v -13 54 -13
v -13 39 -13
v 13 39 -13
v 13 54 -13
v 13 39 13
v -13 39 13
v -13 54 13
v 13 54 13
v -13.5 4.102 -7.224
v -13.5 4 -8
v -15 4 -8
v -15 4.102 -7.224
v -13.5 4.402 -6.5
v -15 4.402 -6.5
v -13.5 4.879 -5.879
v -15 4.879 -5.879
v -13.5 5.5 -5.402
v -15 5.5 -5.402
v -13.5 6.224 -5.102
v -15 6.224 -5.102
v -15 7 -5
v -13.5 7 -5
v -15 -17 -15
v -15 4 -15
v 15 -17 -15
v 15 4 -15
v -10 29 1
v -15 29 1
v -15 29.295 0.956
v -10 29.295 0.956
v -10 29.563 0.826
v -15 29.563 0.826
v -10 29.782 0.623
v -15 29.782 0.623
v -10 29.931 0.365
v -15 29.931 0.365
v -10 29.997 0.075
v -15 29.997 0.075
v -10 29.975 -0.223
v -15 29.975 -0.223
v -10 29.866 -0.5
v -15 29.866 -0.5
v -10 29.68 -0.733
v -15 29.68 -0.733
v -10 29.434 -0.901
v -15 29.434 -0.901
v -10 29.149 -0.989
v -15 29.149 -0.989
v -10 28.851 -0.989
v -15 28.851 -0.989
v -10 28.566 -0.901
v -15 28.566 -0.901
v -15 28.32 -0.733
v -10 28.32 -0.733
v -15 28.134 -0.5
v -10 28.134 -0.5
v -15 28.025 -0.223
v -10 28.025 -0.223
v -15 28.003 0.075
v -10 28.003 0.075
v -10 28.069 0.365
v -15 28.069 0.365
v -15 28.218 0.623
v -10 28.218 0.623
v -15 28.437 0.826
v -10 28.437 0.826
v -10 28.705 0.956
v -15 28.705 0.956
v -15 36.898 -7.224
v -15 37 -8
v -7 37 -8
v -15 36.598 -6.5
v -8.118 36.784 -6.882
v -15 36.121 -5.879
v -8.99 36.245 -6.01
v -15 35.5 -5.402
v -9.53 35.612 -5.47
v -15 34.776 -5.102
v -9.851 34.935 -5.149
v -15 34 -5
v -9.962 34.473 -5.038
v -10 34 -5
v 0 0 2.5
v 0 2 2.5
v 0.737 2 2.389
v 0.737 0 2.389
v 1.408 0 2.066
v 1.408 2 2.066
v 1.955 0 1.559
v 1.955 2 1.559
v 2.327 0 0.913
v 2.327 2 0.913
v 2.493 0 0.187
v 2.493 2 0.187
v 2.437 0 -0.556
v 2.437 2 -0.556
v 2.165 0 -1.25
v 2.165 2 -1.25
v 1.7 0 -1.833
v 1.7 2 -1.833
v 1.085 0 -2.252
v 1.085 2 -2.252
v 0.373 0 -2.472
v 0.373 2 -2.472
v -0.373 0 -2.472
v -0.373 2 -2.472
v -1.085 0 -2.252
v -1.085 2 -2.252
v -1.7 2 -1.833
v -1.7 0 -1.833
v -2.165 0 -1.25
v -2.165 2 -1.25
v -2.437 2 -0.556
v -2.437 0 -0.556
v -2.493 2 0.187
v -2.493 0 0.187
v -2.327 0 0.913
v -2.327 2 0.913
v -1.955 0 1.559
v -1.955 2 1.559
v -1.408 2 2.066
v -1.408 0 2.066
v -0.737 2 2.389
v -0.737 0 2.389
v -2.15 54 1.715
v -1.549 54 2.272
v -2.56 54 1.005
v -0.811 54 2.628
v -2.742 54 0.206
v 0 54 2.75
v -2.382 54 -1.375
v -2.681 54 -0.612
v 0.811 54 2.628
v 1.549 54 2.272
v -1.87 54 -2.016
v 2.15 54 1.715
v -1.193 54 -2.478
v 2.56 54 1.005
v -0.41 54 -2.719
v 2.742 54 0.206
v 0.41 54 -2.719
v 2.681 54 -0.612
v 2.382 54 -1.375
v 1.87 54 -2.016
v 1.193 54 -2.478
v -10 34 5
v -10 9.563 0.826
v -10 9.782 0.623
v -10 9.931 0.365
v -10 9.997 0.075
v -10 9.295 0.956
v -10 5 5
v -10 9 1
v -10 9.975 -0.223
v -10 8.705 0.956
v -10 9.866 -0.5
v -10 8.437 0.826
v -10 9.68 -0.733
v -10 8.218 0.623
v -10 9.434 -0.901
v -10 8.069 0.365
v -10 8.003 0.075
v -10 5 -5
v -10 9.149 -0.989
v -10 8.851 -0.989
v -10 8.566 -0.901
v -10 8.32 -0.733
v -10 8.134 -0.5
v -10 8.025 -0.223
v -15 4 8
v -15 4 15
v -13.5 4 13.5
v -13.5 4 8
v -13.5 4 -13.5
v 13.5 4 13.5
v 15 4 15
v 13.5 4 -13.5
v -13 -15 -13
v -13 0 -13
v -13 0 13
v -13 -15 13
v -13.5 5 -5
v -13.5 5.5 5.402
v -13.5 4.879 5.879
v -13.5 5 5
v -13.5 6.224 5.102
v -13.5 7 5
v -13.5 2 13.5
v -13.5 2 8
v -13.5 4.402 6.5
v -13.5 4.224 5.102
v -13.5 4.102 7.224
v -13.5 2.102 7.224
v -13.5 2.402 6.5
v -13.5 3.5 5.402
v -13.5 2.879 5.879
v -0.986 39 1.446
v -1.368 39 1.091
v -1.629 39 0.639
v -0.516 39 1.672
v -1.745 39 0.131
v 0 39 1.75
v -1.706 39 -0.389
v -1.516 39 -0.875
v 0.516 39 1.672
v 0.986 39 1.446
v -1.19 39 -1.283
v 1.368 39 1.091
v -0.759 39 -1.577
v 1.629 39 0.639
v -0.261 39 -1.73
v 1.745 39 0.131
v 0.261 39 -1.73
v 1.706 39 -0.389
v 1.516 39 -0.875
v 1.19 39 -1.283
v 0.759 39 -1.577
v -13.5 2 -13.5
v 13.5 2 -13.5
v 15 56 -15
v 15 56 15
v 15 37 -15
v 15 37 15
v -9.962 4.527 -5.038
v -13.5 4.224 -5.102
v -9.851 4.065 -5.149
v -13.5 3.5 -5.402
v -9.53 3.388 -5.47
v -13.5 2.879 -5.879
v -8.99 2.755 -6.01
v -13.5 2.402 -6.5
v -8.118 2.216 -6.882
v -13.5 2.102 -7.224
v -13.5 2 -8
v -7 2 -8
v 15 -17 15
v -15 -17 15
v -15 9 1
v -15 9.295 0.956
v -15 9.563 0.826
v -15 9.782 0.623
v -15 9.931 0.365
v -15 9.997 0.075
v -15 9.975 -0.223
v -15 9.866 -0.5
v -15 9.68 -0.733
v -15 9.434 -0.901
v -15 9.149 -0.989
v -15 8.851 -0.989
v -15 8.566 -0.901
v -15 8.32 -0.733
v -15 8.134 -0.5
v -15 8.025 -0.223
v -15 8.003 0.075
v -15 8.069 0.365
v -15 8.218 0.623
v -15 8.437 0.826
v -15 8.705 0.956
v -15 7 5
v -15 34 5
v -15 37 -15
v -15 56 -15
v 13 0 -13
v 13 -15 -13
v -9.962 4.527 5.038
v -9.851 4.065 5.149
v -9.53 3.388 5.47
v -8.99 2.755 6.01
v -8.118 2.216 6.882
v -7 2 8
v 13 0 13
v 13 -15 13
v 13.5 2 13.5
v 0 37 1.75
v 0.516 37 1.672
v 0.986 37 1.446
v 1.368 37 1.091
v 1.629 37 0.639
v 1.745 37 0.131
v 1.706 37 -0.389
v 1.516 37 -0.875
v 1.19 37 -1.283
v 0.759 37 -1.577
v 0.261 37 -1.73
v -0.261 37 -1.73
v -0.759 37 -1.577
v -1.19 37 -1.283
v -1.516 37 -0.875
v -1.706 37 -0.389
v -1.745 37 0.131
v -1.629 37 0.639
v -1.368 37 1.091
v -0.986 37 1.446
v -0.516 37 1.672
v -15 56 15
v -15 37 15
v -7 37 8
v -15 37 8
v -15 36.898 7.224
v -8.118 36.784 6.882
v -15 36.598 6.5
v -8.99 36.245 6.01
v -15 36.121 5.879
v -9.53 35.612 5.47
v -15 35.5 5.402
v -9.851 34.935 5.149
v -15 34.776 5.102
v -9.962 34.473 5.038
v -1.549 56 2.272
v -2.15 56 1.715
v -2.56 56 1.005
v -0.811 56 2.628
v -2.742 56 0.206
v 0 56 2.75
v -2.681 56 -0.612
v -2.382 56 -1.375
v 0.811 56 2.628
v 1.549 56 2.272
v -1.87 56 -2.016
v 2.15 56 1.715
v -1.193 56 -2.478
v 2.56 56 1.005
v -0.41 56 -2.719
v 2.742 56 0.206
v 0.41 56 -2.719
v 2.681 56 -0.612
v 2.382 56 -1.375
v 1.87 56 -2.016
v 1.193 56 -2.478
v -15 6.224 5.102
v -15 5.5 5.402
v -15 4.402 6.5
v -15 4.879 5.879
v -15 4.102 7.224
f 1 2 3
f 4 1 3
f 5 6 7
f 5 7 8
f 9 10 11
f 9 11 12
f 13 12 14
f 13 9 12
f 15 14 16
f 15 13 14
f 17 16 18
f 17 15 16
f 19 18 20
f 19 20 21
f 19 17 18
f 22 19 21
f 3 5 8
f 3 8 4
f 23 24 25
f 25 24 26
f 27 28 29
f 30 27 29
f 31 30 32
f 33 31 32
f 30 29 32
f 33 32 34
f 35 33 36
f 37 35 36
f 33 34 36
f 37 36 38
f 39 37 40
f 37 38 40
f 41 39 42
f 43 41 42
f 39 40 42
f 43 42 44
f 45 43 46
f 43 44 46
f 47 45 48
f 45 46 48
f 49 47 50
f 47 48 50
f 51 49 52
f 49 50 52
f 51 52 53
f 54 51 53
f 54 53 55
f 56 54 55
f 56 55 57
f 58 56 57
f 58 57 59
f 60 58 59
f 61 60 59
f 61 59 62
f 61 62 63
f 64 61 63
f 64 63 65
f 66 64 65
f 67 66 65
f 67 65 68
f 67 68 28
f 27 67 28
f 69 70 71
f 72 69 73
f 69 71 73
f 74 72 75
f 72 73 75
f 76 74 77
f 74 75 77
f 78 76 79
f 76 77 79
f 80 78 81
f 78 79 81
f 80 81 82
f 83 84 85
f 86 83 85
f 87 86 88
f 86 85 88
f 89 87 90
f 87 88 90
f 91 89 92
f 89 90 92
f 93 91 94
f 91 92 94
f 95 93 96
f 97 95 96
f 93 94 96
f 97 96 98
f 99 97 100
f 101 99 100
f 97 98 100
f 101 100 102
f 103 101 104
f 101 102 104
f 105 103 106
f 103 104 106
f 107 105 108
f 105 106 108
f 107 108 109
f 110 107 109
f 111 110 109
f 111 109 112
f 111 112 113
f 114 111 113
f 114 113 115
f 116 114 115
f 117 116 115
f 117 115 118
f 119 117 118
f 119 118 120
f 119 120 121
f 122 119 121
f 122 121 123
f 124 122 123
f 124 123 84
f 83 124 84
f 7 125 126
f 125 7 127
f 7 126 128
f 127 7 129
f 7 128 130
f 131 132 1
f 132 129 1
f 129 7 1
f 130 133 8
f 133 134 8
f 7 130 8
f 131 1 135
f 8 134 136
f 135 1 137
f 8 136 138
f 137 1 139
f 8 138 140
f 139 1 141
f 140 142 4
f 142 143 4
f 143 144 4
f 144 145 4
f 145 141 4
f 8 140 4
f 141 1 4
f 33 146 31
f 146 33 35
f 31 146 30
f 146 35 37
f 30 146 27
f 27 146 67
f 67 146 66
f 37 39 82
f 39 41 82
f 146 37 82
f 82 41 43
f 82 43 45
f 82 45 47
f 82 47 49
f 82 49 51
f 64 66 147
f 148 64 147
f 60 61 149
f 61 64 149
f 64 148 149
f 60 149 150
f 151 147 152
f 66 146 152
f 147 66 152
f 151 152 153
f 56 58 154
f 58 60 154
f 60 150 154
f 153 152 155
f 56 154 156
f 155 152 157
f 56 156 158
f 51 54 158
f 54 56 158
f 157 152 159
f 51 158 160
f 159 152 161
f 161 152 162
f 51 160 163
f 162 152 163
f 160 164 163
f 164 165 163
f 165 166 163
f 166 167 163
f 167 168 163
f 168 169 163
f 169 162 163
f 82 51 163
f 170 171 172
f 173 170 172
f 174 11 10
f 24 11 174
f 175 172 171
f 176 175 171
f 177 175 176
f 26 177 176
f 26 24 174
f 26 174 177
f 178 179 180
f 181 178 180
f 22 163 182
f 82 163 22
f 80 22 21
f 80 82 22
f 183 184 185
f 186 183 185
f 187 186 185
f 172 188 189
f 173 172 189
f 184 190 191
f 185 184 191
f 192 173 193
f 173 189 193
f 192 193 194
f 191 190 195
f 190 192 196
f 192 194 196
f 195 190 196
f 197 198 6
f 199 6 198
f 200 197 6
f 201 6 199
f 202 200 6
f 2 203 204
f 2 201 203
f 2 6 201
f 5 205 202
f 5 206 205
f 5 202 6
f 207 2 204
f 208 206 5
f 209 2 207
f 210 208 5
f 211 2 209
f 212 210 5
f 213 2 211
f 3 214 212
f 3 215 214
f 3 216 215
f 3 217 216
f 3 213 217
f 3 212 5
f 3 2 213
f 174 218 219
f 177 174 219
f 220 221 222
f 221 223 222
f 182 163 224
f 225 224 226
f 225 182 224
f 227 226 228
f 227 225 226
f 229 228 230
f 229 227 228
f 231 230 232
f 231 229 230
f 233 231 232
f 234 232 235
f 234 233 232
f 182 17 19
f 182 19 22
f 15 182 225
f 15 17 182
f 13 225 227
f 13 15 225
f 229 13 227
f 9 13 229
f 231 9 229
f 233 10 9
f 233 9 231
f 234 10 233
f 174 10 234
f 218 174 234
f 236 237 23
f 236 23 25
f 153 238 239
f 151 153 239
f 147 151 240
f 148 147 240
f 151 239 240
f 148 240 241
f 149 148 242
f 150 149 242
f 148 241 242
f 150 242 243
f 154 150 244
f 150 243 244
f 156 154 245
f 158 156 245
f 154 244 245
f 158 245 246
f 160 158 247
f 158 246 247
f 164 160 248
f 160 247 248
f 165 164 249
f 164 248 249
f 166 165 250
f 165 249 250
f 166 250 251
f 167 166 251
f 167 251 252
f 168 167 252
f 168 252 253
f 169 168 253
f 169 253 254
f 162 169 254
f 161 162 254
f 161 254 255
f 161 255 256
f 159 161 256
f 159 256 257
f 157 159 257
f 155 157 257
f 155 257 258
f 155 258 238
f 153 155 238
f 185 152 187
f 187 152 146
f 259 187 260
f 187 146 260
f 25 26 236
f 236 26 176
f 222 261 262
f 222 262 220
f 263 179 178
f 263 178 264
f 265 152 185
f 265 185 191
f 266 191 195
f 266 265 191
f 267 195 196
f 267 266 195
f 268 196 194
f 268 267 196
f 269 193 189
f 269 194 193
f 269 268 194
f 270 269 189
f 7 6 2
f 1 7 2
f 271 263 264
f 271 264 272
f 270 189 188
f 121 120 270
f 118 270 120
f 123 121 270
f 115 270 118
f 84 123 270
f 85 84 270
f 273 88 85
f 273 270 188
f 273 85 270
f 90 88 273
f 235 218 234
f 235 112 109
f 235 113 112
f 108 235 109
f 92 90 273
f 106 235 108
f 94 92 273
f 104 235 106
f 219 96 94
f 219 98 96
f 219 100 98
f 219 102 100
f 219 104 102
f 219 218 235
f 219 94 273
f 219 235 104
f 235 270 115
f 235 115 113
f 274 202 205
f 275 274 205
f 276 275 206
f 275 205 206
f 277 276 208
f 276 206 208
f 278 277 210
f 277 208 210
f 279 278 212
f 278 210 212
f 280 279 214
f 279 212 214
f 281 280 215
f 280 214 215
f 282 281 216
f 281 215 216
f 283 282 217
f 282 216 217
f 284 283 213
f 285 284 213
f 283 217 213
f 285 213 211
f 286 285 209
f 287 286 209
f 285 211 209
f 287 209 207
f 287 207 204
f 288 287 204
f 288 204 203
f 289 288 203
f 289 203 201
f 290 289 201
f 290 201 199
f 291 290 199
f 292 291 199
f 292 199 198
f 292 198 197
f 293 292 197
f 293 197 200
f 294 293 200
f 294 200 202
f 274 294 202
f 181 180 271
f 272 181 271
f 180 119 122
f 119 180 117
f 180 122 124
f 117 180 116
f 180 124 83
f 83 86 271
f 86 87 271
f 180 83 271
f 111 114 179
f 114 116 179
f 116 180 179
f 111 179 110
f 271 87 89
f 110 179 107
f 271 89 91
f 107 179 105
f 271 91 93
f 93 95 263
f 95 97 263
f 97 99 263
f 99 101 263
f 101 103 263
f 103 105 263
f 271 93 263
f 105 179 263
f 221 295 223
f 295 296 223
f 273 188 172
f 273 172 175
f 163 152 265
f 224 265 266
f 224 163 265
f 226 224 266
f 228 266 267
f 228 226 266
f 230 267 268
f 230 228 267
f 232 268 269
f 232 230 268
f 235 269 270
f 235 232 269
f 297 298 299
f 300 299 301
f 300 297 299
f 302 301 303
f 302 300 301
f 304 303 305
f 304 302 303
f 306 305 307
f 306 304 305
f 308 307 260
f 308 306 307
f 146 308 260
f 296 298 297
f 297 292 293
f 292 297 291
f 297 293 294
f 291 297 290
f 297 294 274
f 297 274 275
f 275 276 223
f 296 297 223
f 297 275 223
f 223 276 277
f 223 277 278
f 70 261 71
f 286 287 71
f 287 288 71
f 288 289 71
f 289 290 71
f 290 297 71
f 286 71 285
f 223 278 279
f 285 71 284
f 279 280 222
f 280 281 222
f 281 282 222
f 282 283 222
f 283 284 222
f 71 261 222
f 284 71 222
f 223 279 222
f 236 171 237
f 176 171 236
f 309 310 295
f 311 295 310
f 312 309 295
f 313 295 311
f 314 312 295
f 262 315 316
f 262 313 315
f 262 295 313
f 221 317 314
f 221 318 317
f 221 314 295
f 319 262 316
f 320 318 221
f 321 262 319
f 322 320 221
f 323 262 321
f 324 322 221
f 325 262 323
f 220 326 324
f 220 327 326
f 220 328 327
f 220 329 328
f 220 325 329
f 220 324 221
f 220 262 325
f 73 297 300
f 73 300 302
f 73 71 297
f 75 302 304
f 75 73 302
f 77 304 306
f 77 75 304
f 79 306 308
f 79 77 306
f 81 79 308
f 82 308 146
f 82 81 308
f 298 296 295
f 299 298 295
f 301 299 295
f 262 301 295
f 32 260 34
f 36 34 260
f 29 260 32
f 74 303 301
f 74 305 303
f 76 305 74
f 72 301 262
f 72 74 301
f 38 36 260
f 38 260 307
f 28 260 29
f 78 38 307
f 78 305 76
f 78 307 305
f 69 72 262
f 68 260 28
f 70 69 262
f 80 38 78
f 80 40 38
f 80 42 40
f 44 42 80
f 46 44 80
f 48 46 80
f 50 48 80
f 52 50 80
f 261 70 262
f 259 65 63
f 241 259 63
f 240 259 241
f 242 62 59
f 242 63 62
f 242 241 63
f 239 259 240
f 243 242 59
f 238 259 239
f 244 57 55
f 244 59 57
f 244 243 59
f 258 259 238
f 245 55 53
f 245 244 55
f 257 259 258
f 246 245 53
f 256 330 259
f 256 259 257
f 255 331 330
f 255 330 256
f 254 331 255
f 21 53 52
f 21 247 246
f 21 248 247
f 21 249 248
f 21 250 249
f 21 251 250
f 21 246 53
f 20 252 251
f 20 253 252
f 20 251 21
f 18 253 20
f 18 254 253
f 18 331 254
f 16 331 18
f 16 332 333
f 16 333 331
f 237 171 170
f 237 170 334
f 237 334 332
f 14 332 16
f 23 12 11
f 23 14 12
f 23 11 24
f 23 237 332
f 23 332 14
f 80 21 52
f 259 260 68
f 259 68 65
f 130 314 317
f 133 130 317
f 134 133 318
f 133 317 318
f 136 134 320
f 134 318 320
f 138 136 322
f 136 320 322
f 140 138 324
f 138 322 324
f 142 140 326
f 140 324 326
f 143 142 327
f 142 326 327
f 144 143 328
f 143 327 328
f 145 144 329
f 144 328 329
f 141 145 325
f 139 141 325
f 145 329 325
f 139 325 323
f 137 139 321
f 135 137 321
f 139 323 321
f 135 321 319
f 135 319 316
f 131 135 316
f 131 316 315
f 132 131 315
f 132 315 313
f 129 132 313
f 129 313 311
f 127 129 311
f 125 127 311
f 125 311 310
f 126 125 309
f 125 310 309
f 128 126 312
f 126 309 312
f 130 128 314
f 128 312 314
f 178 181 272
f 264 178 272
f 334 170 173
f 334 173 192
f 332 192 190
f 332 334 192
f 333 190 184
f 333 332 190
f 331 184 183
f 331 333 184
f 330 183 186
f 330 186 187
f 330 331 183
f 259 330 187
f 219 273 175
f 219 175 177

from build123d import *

# Parameters (mm, degrees)
SKETCH_2_W          = 30
SKETCH_2_H          = 30
EXTRUDE_1_DEPTH     = 2
SKETCH_3_W          = 30
SKETCH_3_H          = 30
SKETCH_3_W_2        = 26
SKETCH_3_H_2        = 26
EXTRUDE_2_DEPTH     = 15
SKETCH_4_W          = 30
SKETCH_4_H          = 30
SKETCH_4_W_2        = 27
SKETCH_4_H_2        = 27
EXTRUDE_3_DEPTH     = 2
SKETCH_5_W          = 5
SKETCH_5_H          = 10
EXTRUDE_2_2_DEPTH   = 35
SKETCH_6_R          = 1
CUT_EXTRUDE_1_DEPTH = 50.939963957
SKETCH_8_R          = 2.5
CUT_EXTRUDE_2_DEPTH = 41.926763859
FILLET_1_R          = 3
FILLET_2_R          = 3
SKETCH_9_W          = 30
SKETCH_9_H          = 30
EXTRUDE_3_2_DEPTH   = 2
SKETCH_10_W         = 30
SKETCH_10_H         = 30
SKETCH_10_W_2       = 26
SKETCH_10_H_2       = 26
EXTRUDE_4_DEPTH     = 15
SKETCH_11_R         = 1.75
CUT_EXTRUDE_3_DEPTH = 3
FILLET_3_R          = 3
SKETCH_13_W         = 30
SKETCH_13_H         = 30
EXTRUDE_4_2_DEPTH   = 2
SKETCH_14_W         = 30
SKETCH_14_H         = 30
EXTRUDE_5_DEPTH     = 2
SKETCH_15_R         = 2.75
CUT_EXTRUDE_4_DEPTH = 2


with BuildPart() as part:
    # Эскиз2 → Бобышка-Вытянуть1 (new body)
    with BuildSketch(Plane(origin=(0, 0, 0), x_dir=(1, 0, 0), z_dir=(0, 1, 0))):
        Rectangle(SKETCH_2_W, SKETCH_2_H)
    extrude(amount=EXTRUDE_1_DEPTH)

    # Эскиз3 → Extrude 2 (add)
    with BuildSketch(Plane.XZ):
        Rectangle(SKETCH_3_W, SKETCH_3_H)
        Rectangle(SKETCH_3_W_2, SKETCH_3_H_2, mode=Mode.SUBTRACT)
    extrude(amount=EXTRUDE_2_DEPTH)

    # Эскиз4 → Extrude 3 (add)
    with BuildSketch(Plane(origin=(0, 2, 0), x_dir=(1, 0, 0), z_dir=(0, 1, 0))):
        Rectangle(SKETCH_4_W, SKETCH_4_H)
        Rectangle(SKETCH_4_W_2, SKETCH_4_H_2, mode=Mode.SUBTRACT)
    extrude(amount=EXTRUDE_3_DEPTH)

    # Эскиз5 → Extrude 2 2 (add)
    with BuildSketch(Plane(origin=(0, 2, 0), x_dir=(1, 0, 0), z_dir=(0, 1, 0))):
        with Locations((-12.5, 0)):
            Rectangle(SKETCH_5_W, SKETCH_5_H)
    extrude(amount=EXTRUDE_2_2_DEPTH)

    # Эскиз6 → Вырез-Вытянуть1 (cut, through all)
    with BuildSketch(Plane.ZY.offset(15)):
        with Locations((0, 29)):
            Circle(SKETCH_6_R)
        with Locations((0, 9)):
            Circle(SKETCH_6_R)
    extrude(amount=-CUT_EXTRUDE_1_DEPTH, mode=Mode.SUBTRACT)

    # Эскиз8 → Вырез-Вытянуть2 (cut, through all)
    with BuildSketch(Plane(origin=(0, 2, 0), x_dir=(1, 0, 0), z_dir=(0, 1, 0))):
        with Locations(Location((0, 0, 0), (0, 0, 270))):
            Circle(SKETCH_8_R)
    extrude(amount=-CUT_EXTRUDE_2_DEPTH, mode=Mode.SUBTRACT)

    # Скругление1
    # the kernel refuses this fillet: 3 mm, written as the material it adds along each edge
    with BuildSketch(Plane(origin=(-10, 2, -5), x_dir=(1, 0, 0), z_dir=(0, 0, 1))) as fillet_1_piece_1:
        with BuildLine():
            CenterArc((FILLET_1_R, FILLET_1_R), FILLET_1_R, 180, 90)
            Line((0, FILLET_1_R), (0, 0))
            Line((0, 0), (FILLET_1_R, 0))
        make_face()
    extrude(amount=10)
    with BuildSketch(Plane(origin=(-21, 2, -5), x_dir=(0, 1, 0), z_dir=(1, 0, 0))) as fillet_1_piece_2_section:
        with BuildLine():
            CenterArc((FILLET_1_R, -FILLET_1_R), FILLET_1_R, 90, 90)
            Line((0, -FILLET_1_R), (0, 0))
            Line((0, 0), (FILLET_1_R, 0))
        make_face()
    fillet_1_piece_2 = extrude(amount=11, mode=Mode.PRIVATE)
    fillet_1_piece_2 = split(fillet_1_piece_2, bisect_by=Plane(origin=(-15, 2, -5), z_dir=(1, 0, 0)), keep=Keep.TOP, mode=Mode.PRIVATE)
    add(fillet_1_piece_2)
    with BuildSketch(Plane(origin=(-10, 2, 5), x_dir=(0, 1, 0), z_dir=(-1, 0, 0))) as fillet_1_piece_3_section:
        with BuildLine():
            CenterArc((FILLET_1_R, -FILLET_1_R), FILLET_1_R, 90, 90)
            Line((0, -FILLET_1_R), (0, 0))
            Line((0, 0), (FILLET_1_R, 0))
        make_face()
    fillet_1_piece_3 = extrude(amount=11, mode=Mode.PRIVATE)
    fillet_1_piece_3 = split(fillet_1_piece_3, bisect_by=Plane(origin=(-15, 2, 5), z_dir=(1, 0, 0)), keep=Keep.TOP, mode=Mode.PRIVATE)
    add(fillet_1_piece_3)
    with BuildSketch(Plane(origin=(-13.5, 2, -5), x_dir=(0, 1, 0), z_dir=(1, 0, 0))) as fillet_1_piece_4a_section:
        with BuildLine():
            CenterArc((FILLET_1_R, -FILLET_1_R), FILLET_1_R, 90, 90)
            Line((0, -FILLET_1_R), (0, 0))
            Line((0, 0), (FILLET_1_R, 0))
        make_face()
    fillet_1_piece_4a = extrude(amount=11, mode=Mode.PRIVATE)
    fillet_1_piece_4a = split(fillet_1_piece_4a, bisect_by=Plane(origin=(-10, 2, -5), z_dir=(1, 0, 0)), keep=Keep.TOP, mode=Mode.PRIVATE)
    with BuildSketch(Plane(origin=(-10, 2, -12.5), x_dir=(1, 0, 0), z_dir=(0, 0, 1))) as fillet_1_piece_4b_section:
        with BuildLine():
            CenterArc((FILLET_1_R, FILLET_1_R), FILLET_1_R, 180, 90)
            Line((0, FILLET_1_R), (0, 0))
            Line((0, 0), (FILLET_1_R, 0))
        make_face()
    fillet_1_piece_4b = extrude(amount=17.5, mode=Mode.PRIVATE)
    fillet_1_piece_4b = split(fillet_1_piece_4b, bisect_by=Plane(origin=(-10, 2, -5), z_dir=(0, 0, -1)), keep=Keep.TOP, mode=Mode.PRIVATE)
    fillet_1_piece_4 = fillet_1_piece_4a & fillet_1_piece_4b
    add(fillet_1_piece_4)
    with BuildSketch(Plane(origin=(-2.5, 2, 5), x_dir=(0, 1, 0), z_dir=(-1, 0, 0))) as fillet_1_piece_5a_section:
        with BuildLine():
            CenterArc((FILLET_1_R, -FILLET_1_R), FILLET_1_R, 90, 90)
            Line((0, -FILLET_1_R), (0, 0))
            Line((0, 0), (FILLET_1_R, 0))
        make_face()
    fillet_1_piece_5a = extrude(amount=11, mode=Mode.PRIVATE)
    fillet_1_piece_5a = split(fillet_1_piece_5a, bisect_by=Plane(origin=(-10, 2, 5), z_dir=(1, 0, 0)), keep=Keep.TOP, mode=Mode.PRIVATE)
    with BuildSketch(Plane(origin=(-10, 2, -5), x_dir=(1, 0, 0), z_dir=(0, 0, 1))) as fillet_1_piece_5b_section:
        with BuildLine():
            CenterArc((FILLET_1_R, FILLET_1_R), FILLET_1_R, 180, 90)
            Line((0, FILLET_1_R), (0, 0))
            Line((0, 0), (FILLET_1_R, 0))
        make_face()
    fillet_1_piece_5b = extrude(amount=17.5, mode=Mode.PRIVATE)
    fillet_1_piece_5b = split(fillet_1_piece_5b, bisect_by=Plane(origin=(-10, 2, 5), z_dir=(0, 0, 1)), keep=Keep.TOP, mode=Mode.PRIVATE)
    fillet_1_piece_5 = fillet_1_piece_5a & fillet_1_piece_5b
    add(fillet_1_piece_5)

    # Скругление2
    # the kernel refuses this fillet: 3 mm, written as the material it adds along each edge
    with BuildSketch(Plane(origin=(-13.5, 4, -5.171572875), x_dir=(0, 0.9983685980477195, 0.0570976569767209), z_dir=(-1, 0, 0)), Plane(origin=(-15, 4, 5.171572875), x_dir=(0, 0.9983685980477195, -0.0570976569767209), z_dir=(1, 0, 0))) as fillet_2_piece_1:
        with BuildLine():
            CenterArc((2.833609232, 2.995105794), FILLET_2_R, 183.273234946, 90)
            Line((-0.161496562, 2.823812823), (-0.461007141, 2.806683526))
            Line((-0.461007141, 2.806683526), (-0.299510579, -0.017129297))
            Line((-0.299510579, -0.017129297), (-0.083687204, -0.288091048))
            ThreePointArc((-0.083687204, -0.288091048), (1.025294304, -0.413705893), (3.0220315, -0.299510579))
            Line((3.0220315, -0.299510579), (3.004902203, 0))
        make_face()
    extrude(amount=1.5)

    # Эскиз9 → Extrude 3 2 (add)
    with BuildSketch(Plane(origin=(0, 37, 0), x_dir=(1, 0, 0), z_dir=(0, 1, 0))):
        Rectangle(SKETCH_9_W, SKETCH_9_H)
    extrude(amount=EXTRUDE_3_2_DEPTH)

    # Эскиз10 → Extrude 4 (add)
    with BuildSketch(Plane(origin=(0, 39, 0), x_dir=(1, 0, 0), z_dir=(0, 1, 0))):
        Rectangle(SKETCH_10_W, SKETCH_10_H)
        Rectangle(SKETCH_10_W_2, SKETCH_10_H_2, mode=Mode.SUBTRACT)
    extrude(amount=EXTRUDE_4_DEPTH)

    # Эскиз11 → Вырез-Вытянуть3 (cut)
    with BuildSketch(Plane(origin=(0, 39, 0), x_dir=(1, 0, 0), z_dir=(0, 1, 0))):
        with Locations(Location((0, 0, 0), (0, 0, 270))):
            Circle(SKETCH_11_R)
    extrude(amount=-CUT_EXTRUDE_3_DEPTH, mode=Mode.SUBTRACT)

    # Скругление3
    fillet_3_edges = [part.edges().sort_by_distance(p)[0] for p in [
        (-10, 37, 0),
        (-12.5, 37, -5),
        (-12.5, 37, 5),
    ]]
    fillet(fillet_3_edges, radius=FILLET_3_R)

    # Эскиз13 → Extrude 4 2 (add)
    with BuildSketch(Plane.XZ.offset(15)):
        Rectangle(SKETCH_13_W, SKETCH_13_H)
    extrude(amount=EXTRUDE_4_2_DEPTH)

    # Эскиз14 → Бобышка-Вытянуть5 (add)
    with BuildSketch(Plane(origin=(0, 54, 0), x_dir=(1, 0, 0), z_dir=(0, 1, 0))):
        Rectangle(SKETCH_14_W, SKETCH_14_H)
    extrude(amount=EXTRUDE_5_DEPTH)

    # Эскиз15 → Вырез-Вытянуть4 (cut)
    with BuildSketch(Plane(origin=(0, 56, 0), x_dir=(1, 0, 0), z_dir=(0, 1, 0))):
        with Locations(Location((0, 0, 0), (0, 0, 270))):
            Circle(SKETCH_15_R)
    extrude(amount=-CUT_EXTRUDE_4_DEPTH, mode=Mode.SUBTRACT)


solid = part.part
